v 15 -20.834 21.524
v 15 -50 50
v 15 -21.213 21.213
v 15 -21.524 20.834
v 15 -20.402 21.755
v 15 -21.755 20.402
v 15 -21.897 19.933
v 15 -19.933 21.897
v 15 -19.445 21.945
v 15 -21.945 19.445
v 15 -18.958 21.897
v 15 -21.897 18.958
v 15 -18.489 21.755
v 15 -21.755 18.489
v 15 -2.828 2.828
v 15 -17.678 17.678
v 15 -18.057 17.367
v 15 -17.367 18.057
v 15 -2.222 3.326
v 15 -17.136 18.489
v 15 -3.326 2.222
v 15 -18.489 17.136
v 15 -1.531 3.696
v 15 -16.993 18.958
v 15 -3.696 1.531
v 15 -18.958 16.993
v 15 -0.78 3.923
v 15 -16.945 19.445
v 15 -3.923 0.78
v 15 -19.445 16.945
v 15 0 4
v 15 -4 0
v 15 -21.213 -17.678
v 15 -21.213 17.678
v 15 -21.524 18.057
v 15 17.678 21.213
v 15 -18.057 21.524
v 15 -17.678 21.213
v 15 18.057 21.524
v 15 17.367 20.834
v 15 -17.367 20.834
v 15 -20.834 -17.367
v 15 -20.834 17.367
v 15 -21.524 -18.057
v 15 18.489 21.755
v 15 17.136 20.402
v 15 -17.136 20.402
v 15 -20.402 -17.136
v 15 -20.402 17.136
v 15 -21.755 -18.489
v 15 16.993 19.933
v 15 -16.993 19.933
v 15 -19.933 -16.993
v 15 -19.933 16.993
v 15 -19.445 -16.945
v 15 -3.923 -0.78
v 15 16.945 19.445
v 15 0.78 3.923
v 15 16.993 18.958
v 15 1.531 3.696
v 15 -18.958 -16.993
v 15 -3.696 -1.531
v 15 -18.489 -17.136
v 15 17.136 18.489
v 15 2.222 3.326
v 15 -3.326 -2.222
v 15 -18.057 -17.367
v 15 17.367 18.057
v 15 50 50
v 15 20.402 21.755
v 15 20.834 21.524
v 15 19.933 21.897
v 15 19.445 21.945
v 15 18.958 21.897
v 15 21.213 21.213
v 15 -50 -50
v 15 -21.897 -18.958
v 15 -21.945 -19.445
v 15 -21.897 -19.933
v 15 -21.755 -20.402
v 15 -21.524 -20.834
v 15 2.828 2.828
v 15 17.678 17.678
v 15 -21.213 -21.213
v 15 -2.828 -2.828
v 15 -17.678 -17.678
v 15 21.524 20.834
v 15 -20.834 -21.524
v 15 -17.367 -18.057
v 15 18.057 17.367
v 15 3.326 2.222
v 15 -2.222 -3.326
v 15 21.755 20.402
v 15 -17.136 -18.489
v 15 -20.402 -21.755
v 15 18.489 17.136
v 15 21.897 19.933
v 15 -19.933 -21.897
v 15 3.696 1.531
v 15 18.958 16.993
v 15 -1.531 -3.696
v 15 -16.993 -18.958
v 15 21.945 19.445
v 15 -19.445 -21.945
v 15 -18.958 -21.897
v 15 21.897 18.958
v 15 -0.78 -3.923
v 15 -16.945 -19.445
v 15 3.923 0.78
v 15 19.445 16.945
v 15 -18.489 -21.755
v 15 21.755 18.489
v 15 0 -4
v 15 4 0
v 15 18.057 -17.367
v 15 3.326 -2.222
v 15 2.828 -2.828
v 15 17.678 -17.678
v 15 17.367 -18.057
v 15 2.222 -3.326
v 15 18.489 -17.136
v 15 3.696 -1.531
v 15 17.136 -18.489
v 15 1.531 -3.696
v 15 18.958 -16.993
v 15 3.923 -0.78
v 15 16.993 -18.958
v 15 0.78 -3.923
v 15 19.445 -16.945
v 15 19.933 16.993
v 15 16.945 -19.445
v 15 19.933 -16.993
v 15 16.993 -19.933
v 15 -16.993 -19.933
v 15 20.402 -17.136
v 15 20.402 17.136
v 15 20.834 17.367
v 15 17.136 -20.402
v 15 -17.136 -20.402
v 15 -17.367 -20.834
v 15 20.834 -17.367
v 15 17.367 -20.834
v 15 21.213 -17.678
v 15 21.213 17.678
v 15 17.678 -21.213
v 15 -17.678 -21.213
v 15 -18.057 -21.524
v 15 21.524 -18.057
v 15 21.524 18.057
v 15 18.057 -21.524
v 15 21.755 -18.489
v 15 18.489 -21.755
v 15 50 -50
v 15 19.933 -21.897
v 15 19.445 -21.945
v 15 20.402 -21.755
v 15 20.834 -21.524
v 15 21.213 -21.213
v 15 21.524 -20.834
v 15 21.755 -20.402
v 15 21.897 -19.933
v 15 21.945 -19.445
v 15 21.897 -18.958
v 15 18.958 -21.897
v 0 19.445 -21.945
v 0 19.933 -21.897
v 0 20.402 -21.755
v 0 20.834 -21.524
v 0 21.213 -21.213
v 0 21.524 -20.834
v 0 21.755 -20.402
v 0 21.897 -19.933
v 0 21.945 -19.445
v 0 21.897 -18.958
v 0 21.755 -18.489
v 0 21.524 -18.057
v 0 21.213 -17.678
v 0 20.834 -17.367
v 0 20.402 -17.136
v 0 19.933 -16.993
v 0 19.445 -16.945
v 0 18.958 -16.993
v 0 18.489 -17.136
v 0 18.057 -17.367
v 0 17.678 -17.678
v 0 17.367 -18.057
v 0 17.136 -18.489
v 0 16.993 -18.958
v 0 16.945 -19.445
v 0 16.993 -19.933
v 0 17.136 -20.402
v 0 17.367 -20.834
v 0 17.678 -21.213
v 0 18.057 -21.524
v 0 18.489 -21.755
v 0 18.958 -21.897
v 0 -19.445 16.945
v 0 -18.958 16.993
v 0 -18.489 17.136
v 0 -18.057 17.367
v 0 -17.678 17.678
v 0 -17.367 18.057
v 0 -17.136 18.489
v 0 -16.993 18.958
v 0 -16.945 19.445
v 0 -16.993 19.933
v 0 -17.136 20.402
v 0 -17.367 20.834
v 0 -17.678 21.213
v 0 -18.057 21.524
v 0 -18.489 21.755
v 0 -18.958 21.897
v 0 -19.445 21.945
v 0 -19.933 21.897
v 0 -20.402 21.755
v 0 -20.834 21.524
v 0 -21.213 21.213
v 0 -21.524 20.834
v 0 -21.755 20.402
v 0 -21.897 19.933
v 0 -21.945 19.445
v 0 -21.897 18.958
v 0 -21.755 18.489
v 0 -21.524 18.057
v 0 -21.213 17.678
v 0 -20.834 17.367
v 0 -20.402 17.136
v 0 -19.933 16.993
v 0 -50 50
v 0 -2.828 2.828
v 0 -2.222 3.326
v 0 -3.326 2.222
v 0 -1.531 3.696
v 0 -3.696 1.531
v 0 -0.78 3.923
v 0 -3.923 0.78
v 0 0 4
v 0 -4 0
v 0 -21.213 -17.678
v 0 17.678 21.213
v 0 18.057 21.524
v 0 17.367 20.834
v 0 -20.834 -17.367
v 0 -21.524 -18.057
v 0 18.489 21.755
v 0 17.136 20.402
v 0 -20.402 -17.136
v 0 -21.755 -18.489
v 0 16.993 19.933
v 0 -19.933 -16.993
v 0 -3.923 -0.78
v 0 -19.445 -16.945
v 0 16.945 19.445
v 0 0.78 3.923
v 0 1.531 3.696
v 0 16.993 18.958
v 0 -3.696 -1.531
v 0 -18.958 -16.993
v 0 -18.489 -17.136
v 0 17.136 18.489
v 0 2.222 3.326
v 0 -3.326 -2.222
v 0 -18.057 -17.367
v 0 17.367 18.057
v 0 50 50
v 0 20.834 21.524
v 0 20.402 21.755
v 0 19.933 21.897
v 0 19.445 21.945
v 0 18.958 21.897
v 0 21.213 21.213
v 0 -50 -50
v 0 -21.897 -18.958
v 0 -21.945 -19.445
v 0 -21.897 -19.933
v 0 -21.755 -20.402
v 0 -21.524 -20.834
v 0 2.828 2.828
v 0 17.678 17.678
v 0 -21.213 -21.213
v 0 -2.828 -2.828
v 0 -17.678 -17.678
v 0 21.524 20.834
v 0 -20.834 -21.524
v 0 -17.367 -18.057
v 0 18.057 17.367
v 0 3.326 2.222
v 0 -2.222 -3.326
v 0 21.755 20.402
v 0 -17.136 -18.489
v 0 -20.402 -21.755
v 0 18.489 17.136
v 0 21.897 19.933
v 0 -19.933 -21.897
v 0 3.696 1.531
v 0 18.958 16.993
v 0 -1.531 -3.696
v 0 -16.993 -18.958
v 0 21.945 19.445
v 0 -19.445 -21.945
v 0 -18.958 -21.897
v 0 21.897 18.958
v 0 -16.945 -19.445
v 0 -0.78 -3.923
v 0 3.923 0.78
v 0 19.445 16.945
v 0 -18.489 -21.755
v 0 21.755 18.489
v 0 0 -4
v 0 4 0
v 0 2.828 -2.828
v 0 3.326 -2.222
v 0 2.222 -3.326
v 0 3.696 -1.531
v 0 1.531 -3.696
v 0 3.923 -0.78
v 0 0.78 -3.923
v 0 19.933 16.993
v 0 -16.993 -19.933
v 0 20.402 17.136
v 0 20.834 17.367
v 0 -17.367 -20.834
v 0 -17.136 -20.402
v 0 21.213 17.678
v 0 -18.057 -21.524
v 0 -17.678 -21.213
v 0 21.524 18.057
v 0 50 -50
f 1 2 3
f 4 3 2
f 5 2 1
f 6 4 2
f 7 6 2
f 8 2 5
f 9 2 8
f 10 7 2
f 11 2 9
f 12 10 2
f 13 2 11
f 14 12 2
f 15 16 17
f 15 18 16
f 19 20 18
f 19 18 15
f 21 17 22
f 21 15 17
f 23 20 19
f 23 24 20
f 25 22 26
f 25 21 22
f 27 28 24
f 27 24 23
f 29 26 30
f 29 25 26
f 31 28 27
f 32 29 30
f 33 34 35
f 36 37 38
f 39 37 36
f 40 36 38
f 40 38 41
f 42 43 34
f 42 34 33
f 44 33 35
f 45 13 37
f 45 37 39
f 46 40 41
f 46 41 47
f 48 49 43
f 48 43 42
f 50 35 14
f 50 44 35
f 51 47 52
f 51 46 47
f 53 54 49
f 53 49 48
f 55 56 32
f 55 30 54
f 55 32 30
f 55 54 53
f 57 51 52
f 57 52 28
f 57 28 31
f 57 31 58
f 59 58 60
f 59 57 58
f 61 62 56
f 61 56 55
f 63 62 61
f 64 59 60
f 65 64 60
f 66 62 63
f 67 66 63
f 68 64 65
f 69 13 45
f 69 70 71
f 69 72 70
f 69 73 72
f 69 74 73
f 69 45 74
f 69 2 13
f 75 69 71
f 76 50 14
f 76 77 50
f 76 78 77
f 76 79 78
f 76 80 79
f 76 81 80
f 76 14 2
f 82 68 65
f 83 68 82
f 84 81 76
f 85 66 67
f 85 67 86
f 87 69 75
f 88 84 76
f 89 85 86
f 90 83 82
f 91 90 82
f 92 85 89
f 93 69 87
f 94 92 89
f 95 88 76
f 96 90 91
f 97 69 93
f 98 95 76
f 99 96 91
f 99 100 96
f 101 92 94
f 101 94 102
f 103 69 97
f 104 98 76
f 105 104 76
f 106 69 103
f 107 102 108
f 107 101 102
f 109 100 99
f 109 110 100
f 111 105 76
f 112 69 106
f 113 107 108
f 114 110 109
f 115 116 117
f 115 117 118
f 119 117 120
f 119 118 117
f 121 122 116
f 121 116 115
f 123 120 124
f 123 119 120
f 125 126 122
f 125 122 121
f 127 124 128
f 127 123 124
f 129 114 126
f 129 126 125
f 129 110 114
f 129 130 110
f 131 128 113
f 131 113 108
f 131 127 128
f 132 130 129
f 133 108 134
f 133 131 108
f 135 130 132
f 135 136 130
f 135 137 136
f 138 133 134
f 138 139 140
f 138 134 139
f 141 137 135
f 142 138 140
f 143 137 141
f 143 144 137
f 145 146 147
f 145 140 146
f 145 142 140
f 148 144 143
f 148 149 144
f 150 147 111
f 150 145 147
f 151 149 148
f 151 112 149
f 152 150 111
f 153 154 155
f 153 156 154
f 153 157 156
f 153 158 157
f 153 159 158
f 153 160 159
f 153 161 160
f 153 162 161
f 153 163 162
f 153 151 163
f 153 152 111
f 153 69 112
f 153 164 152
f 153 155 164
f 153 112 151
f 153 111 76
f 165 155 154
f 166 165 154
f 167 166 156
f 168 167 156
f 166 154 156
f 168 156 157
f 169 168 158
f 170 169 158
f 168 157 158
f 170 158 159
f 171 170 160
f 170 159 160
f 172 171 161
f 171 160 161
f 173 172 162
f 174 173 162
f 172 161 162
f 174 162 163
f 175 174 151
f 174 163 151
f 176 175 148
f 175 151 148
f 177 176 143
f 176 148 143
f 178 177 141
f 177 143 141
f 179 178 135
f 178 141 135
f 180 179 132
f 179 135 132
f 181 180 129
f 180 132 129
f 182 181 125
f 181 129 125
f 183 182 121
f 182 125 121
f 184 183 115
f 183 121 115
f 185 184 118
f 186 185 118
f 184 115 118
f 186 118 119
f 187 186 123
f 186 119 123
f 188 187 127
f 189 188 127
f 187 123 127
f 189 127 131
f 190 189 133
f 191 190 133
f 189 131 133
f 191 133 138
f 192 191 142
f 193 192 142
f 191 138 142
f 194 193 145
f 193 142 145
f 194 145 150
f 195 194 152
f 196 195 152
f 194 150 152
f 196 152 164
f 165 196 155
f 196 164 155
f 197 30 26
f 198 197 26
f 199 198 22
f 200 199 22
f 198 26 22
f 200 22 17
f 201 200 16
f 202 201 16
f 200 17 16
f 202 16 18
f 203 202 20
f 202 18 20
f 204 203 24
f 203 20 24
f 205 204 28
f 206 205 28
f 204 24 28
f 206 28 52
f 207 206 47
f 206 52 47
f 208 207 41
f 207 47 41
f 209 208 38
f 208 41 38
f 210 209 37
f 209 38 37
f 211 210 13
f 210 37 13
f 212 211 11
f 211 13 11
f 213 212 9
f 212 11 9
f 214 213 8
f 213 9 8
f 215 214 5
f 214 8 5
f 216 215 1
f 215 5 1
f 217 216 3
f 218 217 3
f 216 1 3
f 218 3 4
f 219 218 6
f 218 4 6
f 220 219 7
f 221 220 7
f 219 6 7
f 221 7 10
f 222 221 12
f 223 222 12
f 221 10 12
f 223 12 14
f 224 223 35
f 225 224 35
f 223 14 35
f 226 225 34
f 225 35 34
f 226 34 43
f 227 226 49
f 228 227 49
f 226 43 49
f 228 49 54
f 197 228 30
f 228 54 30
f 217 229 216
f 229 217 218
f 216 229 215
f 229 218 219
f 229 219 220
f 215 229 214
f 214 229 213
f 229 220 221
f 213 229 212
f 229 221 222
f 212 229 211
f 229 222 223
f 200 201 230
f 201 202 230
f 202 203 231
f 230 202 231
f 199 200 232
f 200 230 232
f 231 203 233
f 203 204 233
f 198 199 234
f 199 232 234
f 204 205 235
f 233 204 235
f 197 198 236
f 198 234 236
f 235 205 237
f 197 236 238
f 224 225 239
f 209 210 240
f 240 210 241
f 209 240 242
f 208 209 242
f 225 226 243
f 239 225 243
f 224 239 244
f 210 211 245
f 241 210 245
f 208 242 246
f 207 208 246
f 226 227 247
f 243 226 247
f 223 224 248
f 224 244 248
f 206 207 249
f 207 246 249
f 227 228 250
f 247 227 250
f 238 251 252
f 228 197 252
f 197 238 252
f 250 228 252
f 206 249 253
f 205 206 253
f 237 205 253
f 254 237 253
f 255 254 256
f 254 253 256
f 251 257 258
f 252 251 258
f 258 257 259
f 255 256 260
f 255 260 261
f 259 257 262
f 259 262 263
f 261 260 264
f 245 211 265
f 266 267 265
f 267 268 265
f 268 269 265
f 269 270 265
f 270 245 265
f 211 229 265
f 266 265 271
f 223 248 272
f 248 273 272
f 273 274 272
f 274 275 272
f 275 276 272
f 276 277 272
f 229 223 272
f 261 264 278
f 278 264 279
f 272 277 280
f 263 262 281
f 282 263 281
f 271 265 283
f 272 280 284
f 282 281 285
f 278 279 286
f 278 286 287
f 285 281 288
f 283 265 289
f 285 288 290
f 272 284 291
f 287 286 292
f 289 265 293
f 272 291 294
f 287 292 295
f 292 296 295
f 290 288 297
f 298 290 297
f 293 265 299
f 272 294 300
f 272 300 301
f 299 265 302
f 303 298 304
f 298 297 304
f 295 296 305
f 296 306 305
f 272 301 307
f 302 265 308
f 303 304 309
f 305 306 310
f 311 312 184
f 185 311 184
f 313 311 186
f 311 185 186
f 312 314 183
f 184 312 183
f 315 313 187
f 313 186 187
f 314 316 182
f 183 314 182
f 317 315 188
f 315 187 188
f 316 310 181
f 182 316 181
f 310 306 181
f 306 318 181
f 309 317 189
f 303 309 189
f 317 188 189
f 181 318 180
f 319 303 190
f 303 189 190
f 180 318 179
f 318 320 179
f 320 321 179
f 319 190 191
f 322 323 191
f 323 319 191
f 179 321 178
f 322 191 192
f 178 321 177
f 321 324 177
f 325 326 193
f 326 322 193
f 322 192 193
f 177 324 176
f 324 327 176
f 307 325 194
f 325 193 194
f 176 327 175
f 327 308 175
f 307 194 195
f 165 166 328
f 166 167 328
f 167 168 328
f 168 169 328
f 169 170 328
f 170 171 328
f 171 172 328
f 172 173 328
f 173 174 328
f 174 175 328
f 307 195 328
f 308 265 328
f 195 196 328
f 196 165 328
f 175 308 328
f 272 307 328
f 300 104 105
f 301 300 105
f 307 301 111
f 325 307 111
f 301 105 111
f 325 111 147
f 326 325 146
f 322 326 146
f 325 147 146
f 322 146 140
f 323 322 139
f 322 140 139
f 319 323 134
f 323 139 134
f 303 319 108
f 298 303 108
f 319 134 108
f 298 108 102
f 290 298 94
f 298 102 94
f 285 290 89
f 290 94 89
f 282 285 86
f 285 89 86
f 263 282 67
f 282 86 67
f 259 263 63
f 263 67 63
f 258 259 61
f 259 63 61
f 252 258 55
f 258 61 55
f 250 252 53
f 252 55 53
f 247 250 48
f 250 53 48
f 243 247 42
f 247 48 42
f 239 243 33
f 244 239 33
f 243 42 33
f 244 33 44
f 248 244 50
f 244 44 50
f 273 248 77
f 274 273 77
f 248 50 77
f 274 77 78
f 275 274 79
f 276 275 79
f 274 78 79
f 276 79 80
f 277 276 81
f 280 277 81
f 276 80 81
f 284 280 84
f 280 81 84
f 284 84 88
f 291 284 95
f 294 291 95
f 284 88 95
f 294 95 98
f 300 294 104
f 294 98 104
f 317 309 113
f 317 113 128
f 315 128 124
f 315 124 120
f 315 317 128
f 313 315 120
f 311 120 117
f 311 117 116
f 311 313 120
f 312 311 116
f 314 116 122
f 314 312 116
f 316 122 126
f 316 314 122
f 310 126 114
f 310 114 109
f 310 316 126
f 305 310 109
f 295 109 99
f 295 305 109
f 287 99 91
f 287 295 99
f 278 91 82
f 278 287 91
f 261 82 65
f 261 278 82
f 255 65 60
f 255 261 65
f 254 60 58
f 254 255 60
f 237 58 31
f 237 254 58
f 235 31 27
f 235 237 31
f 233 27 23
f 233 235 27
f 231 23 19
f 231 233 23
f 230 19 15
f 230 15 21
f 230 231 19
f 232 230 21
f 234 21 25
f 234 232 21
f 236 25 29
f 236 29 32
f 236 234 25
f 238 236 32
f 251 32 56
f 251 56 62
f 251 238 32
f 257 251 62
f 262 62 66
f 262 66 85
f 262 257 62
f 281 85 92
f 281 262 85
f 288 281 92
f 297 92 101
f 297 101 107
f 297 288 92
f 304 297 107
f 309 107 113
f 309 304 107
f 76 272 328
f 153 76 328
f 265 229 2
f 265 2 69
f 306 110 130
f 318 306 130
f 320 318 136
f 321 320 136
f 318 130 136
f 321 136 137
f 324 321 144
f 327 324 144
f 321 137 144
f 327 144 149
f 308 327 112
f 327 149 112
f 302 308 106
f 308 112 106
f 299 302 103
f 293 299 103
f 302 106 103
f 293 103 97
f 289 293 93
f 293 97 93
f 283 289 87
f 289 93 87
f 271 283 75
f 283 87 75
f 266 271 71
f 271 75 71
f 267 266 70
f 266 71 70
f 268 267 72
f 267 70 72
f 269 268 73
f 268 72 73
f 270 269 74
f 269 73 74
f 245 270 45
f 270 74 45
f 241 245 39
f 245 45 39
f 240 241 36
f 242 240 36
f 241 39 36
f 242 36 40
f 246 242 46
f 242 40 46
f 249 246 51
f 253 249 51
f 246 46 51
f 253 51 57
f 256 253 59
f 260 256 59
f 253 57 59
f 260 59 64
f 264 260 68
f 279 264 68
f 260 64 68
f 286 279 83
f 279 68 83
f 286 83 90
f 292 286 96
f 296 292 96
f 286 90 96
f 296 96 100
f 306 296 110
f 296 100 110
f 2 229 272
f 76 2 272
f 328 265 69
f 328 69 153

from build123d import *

# Parameters (mm, degrees)
SKETCH2_W           = 100
SKETCH2_H           = 100
SKETCH2_R           = 4
BOSS_EXTRUDE1_DEPTH = 15
SKETCH3_R           = 2.5
CUT_EXTRUDE1_DEPTH  = 15


with BuildPart() as part:
    # Sketch2 → Boss-Extrude1 (new body)
    with BuildSketch(Plane(origin=(0, 0, 0), x_dir=(0, 0, -1), z_dir=(1, 0, 0))):
        Rectangle(SKETCH2_W, SKETCH2_H)
        Circle(SKETCH2_R, mode=Mode.SUBTRACT)
    extrude(amount=BOSS_EXTRUDE1_DEPTH)

    # Sketch3 → Cut-Extrude1 (cut)
    with BuildSketch(Plane(origin=(15, 0, 0), x_dir=(0, 0, -1), z_dir=(1, 0, 0))):
        with Locations((-19.445436483, 19.445436483)):
            Circle(SKETCH3_R)
        with Locations((19.445436483, 19.445436483)):
            Circle(SKETCH3_R)
        with Locations((19.445436483, -19.445436483)):
            Circle(SKETCH3_R)
        with Locations((-19.445436483, -19.445436483)):
            Circle(SKETCH3_R)
    extrude(amount=-CUT_EXTRUDE1_DEPTH, mode=Mode.SUBTRACT)


solid = part.part
